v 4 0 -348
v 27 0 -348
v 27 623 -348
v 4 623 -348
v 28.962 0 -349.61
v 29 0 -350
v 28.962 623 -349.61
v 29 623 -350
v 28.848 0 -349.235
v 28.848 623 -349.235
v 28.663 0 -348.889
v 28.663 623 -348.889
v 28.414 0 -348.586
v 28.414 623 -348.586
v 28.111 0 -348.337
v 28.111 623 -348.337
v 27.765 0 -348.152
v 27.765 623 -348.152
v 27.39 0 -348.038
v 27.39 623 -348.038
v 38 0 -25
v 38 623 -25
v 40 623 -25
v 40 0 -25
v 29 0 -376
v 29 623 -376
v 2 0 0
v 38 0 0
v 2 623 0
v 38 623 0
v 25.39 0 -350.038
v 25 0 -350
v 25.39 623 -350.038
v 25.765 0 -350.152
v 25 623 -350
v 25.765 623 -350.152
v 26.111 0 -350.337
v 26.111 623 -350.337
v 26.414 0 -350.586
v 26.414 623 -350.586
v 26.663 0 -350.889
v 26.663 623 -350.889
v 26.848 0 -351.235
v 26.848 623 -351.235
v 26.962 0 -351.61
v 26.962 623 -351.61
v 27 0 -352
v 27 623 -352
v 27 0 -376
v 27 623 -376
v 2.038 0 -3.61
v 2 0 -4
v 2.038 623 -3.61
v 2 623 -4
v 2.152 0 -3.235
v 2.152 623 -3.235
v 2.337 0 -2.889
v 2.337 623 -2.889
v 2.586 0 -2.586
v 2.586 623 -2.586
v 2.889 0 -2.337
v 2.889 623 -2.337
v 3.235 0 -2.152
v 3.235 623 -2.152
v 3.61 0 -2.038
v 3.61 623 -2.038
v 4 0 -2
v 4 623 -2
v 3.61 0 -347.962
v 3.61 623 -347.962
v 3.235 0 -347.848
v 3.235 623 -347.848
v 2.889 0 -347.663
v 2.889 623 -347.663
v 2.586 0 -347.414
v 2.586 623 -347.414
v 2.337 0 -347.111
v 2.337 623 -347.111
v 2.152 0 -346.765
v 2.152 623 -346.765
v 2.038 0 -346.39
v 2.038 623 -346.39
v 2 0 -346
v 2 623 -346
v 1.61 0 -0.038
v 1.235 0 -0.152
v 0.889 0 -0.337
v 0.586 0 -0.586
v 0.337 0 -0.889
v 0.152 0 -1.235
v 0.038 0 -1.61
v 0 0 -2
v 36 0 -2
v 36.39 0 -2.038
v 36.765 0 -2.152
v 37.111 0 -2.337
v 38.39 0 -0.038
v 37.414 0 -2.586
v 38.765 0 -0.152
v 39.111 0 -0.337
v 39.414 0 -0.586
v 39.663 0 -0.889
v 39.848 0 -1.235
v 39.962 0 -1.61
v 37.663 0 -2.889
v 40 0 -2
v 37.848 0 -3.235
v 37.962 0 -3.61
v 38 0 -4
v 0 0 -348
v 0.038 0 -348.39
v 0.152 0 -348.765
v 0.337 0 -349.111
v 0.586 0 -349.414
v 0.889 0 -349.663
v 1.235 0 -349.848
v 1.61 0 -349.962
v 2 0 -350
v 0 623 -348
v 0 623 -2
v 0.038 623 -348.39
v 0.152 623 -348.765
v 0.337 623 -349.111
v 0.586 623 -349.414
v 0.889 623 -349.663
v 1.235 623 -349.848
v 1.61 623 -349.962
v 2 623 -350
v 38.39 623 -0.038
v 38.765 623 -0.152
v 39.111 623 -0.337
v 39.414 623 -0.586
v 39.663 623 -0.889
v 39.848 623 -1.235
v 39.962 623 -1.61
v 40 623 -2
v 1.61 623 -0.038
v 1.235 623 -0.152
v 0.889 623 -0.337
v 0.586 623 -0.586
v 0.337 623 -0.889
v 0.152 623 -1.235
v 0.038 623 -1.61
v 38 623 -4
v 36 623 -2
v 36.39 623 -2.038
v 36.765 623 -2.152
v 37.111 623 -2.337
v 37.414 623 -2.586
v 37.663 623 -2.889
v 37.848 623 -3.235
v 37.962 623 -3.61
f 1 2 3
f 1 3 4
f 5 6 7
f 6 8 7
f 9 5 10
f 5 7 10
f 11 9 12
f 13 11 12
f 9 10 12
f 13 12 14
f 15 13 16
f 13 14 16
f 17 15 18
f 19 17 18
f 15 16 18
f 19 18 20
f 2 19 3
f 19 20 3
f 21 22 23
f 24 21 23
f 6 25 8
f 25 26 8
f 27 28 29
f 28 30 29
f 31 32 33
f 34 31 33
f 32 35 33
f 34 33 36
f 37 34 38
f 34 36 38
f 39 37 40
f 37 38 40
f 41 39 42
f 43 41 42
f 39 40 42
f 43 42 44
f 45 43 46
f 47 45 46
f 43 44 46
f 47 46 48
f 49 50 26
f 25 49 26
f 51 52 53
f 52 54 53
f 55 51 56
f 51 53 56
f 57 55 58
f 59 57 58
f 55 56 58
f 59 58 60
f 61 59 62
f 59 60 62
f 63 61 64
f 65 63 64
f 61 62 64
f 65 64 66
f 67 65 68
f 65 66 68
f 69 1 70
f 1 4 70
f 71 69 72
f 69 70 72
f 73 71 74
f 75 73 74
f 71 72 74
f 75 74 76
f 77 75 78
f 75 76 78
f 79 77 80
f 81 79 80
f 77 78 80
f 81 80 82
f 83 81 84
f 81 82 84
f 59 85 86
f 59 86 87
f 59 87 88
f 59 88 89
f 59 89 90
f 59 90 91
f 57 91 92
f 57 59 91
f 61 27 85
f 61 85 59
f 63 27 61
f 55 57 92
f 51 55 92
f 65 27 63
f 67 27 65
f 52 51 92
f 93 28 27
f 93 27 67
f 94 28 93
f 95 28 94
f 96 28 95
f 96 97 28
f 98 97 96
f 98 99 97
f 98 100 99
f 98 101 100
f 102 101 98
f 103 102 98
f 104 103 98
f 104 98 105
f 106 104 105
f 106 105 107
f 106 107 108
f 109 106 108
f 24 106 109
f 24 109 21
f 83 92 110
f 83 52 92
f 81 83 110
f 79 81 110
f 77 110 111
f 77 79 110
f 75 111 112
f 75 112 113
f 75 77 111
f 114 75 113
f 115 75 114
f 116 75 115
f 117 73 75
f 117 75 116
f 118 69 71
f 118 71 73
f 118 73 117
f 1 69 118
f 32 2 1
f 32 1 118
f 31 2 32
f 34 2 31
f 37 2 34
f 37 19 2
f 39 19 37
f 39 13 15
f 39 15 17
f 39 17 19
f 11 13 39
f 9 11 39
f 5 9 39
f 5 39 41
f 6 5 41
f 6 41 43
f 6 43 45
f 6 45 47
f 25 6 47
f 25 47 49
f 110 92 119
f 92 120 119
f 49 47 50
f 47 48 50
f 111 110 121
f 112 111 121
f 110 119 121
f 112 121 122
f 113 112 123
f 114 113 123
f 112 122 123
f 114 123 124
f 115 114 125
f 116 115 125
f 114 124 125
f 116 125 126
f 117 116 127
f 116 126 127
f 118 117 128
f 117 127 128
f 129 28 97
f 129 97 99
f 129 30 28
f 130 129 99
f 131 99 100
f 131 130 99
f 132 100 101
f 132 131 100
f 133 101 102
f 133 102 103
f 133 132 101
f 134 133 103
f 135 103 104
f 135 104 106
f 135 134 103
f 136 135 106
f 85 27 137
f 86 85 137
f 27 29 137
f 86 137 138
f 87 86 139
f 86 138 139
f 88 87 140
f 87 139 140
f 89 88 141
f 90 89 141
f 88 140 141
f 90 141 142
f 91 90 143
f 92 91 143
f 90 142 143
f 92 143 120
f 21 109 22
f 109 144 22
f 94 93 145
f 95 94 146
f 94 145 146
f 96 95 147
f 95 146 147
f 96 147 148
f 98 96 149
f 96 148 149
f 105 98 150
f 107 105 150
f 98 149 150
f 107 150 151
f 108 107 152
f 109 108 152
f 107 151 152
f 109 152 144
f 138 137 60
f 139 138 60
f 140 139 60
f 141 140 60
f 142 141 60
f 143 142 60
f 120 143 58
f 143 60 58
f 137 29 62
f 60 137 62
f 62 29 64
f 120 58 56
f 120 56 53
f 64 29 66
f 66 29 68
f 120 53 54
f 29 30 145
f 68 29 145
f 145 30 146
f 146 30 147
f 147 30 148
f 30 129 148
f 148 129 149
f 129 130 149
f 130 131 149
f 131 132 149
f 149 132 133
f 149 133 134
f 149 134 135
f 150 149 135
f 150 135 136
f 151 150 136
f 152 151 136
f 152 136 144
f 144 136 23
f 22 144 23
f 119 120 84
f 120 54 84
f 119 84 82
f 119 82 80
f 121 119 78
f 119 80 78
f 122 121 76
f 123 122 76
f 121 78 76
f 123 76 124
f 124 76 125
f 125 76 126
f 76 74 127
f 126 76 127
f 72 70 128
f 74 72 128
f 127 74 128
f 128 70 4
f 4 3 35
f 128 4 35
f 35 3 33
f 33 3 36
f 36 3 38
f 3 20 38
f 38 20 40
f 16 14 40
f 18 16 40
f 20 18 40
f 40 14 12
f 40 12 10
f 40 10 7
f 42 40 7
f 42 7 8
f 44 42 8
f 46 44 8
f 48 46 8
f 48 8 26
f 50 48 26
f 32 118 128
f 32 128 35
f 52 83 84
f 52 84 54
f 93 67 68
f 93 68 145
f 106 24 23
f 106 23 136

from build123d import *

# Parameters (mm, degrees)
F3_R = 2


with BuildPart() as f2:
    # F2: sweep along a path in F1
    with BuildLine(Plane.XY) as f2_path:
        Line((0, 0), (0, 623))
    # F0 (on Front) → F2 (sweep)
    with BuildSketch(Plane.XZ):
        Polygon((40, 0), (0, 0), (0, -350), (27, -350), (27, -376), (29, -376), (29, -348), (2, -348), (2, -2), (38, -2), (38, -25), (40, -25), align=None)
    sweep(path=f2_path.line)

    # F3
    f3_edges = [f2.edges().sort_by_distance(p)[0] for p in [
        (40, 311.5, 0),
        (0, 311.5, 0),
        (29, 311.5, -348),
        (2, 311.5, -348),
        (2, 311.5, -2),
        (38, 311.5, -2),
        (27, 311.5, -350),
        (0, 311.5, -350),
    ]]
    fillet(f3_edges, radius=F3_R)


solid = f2.part
